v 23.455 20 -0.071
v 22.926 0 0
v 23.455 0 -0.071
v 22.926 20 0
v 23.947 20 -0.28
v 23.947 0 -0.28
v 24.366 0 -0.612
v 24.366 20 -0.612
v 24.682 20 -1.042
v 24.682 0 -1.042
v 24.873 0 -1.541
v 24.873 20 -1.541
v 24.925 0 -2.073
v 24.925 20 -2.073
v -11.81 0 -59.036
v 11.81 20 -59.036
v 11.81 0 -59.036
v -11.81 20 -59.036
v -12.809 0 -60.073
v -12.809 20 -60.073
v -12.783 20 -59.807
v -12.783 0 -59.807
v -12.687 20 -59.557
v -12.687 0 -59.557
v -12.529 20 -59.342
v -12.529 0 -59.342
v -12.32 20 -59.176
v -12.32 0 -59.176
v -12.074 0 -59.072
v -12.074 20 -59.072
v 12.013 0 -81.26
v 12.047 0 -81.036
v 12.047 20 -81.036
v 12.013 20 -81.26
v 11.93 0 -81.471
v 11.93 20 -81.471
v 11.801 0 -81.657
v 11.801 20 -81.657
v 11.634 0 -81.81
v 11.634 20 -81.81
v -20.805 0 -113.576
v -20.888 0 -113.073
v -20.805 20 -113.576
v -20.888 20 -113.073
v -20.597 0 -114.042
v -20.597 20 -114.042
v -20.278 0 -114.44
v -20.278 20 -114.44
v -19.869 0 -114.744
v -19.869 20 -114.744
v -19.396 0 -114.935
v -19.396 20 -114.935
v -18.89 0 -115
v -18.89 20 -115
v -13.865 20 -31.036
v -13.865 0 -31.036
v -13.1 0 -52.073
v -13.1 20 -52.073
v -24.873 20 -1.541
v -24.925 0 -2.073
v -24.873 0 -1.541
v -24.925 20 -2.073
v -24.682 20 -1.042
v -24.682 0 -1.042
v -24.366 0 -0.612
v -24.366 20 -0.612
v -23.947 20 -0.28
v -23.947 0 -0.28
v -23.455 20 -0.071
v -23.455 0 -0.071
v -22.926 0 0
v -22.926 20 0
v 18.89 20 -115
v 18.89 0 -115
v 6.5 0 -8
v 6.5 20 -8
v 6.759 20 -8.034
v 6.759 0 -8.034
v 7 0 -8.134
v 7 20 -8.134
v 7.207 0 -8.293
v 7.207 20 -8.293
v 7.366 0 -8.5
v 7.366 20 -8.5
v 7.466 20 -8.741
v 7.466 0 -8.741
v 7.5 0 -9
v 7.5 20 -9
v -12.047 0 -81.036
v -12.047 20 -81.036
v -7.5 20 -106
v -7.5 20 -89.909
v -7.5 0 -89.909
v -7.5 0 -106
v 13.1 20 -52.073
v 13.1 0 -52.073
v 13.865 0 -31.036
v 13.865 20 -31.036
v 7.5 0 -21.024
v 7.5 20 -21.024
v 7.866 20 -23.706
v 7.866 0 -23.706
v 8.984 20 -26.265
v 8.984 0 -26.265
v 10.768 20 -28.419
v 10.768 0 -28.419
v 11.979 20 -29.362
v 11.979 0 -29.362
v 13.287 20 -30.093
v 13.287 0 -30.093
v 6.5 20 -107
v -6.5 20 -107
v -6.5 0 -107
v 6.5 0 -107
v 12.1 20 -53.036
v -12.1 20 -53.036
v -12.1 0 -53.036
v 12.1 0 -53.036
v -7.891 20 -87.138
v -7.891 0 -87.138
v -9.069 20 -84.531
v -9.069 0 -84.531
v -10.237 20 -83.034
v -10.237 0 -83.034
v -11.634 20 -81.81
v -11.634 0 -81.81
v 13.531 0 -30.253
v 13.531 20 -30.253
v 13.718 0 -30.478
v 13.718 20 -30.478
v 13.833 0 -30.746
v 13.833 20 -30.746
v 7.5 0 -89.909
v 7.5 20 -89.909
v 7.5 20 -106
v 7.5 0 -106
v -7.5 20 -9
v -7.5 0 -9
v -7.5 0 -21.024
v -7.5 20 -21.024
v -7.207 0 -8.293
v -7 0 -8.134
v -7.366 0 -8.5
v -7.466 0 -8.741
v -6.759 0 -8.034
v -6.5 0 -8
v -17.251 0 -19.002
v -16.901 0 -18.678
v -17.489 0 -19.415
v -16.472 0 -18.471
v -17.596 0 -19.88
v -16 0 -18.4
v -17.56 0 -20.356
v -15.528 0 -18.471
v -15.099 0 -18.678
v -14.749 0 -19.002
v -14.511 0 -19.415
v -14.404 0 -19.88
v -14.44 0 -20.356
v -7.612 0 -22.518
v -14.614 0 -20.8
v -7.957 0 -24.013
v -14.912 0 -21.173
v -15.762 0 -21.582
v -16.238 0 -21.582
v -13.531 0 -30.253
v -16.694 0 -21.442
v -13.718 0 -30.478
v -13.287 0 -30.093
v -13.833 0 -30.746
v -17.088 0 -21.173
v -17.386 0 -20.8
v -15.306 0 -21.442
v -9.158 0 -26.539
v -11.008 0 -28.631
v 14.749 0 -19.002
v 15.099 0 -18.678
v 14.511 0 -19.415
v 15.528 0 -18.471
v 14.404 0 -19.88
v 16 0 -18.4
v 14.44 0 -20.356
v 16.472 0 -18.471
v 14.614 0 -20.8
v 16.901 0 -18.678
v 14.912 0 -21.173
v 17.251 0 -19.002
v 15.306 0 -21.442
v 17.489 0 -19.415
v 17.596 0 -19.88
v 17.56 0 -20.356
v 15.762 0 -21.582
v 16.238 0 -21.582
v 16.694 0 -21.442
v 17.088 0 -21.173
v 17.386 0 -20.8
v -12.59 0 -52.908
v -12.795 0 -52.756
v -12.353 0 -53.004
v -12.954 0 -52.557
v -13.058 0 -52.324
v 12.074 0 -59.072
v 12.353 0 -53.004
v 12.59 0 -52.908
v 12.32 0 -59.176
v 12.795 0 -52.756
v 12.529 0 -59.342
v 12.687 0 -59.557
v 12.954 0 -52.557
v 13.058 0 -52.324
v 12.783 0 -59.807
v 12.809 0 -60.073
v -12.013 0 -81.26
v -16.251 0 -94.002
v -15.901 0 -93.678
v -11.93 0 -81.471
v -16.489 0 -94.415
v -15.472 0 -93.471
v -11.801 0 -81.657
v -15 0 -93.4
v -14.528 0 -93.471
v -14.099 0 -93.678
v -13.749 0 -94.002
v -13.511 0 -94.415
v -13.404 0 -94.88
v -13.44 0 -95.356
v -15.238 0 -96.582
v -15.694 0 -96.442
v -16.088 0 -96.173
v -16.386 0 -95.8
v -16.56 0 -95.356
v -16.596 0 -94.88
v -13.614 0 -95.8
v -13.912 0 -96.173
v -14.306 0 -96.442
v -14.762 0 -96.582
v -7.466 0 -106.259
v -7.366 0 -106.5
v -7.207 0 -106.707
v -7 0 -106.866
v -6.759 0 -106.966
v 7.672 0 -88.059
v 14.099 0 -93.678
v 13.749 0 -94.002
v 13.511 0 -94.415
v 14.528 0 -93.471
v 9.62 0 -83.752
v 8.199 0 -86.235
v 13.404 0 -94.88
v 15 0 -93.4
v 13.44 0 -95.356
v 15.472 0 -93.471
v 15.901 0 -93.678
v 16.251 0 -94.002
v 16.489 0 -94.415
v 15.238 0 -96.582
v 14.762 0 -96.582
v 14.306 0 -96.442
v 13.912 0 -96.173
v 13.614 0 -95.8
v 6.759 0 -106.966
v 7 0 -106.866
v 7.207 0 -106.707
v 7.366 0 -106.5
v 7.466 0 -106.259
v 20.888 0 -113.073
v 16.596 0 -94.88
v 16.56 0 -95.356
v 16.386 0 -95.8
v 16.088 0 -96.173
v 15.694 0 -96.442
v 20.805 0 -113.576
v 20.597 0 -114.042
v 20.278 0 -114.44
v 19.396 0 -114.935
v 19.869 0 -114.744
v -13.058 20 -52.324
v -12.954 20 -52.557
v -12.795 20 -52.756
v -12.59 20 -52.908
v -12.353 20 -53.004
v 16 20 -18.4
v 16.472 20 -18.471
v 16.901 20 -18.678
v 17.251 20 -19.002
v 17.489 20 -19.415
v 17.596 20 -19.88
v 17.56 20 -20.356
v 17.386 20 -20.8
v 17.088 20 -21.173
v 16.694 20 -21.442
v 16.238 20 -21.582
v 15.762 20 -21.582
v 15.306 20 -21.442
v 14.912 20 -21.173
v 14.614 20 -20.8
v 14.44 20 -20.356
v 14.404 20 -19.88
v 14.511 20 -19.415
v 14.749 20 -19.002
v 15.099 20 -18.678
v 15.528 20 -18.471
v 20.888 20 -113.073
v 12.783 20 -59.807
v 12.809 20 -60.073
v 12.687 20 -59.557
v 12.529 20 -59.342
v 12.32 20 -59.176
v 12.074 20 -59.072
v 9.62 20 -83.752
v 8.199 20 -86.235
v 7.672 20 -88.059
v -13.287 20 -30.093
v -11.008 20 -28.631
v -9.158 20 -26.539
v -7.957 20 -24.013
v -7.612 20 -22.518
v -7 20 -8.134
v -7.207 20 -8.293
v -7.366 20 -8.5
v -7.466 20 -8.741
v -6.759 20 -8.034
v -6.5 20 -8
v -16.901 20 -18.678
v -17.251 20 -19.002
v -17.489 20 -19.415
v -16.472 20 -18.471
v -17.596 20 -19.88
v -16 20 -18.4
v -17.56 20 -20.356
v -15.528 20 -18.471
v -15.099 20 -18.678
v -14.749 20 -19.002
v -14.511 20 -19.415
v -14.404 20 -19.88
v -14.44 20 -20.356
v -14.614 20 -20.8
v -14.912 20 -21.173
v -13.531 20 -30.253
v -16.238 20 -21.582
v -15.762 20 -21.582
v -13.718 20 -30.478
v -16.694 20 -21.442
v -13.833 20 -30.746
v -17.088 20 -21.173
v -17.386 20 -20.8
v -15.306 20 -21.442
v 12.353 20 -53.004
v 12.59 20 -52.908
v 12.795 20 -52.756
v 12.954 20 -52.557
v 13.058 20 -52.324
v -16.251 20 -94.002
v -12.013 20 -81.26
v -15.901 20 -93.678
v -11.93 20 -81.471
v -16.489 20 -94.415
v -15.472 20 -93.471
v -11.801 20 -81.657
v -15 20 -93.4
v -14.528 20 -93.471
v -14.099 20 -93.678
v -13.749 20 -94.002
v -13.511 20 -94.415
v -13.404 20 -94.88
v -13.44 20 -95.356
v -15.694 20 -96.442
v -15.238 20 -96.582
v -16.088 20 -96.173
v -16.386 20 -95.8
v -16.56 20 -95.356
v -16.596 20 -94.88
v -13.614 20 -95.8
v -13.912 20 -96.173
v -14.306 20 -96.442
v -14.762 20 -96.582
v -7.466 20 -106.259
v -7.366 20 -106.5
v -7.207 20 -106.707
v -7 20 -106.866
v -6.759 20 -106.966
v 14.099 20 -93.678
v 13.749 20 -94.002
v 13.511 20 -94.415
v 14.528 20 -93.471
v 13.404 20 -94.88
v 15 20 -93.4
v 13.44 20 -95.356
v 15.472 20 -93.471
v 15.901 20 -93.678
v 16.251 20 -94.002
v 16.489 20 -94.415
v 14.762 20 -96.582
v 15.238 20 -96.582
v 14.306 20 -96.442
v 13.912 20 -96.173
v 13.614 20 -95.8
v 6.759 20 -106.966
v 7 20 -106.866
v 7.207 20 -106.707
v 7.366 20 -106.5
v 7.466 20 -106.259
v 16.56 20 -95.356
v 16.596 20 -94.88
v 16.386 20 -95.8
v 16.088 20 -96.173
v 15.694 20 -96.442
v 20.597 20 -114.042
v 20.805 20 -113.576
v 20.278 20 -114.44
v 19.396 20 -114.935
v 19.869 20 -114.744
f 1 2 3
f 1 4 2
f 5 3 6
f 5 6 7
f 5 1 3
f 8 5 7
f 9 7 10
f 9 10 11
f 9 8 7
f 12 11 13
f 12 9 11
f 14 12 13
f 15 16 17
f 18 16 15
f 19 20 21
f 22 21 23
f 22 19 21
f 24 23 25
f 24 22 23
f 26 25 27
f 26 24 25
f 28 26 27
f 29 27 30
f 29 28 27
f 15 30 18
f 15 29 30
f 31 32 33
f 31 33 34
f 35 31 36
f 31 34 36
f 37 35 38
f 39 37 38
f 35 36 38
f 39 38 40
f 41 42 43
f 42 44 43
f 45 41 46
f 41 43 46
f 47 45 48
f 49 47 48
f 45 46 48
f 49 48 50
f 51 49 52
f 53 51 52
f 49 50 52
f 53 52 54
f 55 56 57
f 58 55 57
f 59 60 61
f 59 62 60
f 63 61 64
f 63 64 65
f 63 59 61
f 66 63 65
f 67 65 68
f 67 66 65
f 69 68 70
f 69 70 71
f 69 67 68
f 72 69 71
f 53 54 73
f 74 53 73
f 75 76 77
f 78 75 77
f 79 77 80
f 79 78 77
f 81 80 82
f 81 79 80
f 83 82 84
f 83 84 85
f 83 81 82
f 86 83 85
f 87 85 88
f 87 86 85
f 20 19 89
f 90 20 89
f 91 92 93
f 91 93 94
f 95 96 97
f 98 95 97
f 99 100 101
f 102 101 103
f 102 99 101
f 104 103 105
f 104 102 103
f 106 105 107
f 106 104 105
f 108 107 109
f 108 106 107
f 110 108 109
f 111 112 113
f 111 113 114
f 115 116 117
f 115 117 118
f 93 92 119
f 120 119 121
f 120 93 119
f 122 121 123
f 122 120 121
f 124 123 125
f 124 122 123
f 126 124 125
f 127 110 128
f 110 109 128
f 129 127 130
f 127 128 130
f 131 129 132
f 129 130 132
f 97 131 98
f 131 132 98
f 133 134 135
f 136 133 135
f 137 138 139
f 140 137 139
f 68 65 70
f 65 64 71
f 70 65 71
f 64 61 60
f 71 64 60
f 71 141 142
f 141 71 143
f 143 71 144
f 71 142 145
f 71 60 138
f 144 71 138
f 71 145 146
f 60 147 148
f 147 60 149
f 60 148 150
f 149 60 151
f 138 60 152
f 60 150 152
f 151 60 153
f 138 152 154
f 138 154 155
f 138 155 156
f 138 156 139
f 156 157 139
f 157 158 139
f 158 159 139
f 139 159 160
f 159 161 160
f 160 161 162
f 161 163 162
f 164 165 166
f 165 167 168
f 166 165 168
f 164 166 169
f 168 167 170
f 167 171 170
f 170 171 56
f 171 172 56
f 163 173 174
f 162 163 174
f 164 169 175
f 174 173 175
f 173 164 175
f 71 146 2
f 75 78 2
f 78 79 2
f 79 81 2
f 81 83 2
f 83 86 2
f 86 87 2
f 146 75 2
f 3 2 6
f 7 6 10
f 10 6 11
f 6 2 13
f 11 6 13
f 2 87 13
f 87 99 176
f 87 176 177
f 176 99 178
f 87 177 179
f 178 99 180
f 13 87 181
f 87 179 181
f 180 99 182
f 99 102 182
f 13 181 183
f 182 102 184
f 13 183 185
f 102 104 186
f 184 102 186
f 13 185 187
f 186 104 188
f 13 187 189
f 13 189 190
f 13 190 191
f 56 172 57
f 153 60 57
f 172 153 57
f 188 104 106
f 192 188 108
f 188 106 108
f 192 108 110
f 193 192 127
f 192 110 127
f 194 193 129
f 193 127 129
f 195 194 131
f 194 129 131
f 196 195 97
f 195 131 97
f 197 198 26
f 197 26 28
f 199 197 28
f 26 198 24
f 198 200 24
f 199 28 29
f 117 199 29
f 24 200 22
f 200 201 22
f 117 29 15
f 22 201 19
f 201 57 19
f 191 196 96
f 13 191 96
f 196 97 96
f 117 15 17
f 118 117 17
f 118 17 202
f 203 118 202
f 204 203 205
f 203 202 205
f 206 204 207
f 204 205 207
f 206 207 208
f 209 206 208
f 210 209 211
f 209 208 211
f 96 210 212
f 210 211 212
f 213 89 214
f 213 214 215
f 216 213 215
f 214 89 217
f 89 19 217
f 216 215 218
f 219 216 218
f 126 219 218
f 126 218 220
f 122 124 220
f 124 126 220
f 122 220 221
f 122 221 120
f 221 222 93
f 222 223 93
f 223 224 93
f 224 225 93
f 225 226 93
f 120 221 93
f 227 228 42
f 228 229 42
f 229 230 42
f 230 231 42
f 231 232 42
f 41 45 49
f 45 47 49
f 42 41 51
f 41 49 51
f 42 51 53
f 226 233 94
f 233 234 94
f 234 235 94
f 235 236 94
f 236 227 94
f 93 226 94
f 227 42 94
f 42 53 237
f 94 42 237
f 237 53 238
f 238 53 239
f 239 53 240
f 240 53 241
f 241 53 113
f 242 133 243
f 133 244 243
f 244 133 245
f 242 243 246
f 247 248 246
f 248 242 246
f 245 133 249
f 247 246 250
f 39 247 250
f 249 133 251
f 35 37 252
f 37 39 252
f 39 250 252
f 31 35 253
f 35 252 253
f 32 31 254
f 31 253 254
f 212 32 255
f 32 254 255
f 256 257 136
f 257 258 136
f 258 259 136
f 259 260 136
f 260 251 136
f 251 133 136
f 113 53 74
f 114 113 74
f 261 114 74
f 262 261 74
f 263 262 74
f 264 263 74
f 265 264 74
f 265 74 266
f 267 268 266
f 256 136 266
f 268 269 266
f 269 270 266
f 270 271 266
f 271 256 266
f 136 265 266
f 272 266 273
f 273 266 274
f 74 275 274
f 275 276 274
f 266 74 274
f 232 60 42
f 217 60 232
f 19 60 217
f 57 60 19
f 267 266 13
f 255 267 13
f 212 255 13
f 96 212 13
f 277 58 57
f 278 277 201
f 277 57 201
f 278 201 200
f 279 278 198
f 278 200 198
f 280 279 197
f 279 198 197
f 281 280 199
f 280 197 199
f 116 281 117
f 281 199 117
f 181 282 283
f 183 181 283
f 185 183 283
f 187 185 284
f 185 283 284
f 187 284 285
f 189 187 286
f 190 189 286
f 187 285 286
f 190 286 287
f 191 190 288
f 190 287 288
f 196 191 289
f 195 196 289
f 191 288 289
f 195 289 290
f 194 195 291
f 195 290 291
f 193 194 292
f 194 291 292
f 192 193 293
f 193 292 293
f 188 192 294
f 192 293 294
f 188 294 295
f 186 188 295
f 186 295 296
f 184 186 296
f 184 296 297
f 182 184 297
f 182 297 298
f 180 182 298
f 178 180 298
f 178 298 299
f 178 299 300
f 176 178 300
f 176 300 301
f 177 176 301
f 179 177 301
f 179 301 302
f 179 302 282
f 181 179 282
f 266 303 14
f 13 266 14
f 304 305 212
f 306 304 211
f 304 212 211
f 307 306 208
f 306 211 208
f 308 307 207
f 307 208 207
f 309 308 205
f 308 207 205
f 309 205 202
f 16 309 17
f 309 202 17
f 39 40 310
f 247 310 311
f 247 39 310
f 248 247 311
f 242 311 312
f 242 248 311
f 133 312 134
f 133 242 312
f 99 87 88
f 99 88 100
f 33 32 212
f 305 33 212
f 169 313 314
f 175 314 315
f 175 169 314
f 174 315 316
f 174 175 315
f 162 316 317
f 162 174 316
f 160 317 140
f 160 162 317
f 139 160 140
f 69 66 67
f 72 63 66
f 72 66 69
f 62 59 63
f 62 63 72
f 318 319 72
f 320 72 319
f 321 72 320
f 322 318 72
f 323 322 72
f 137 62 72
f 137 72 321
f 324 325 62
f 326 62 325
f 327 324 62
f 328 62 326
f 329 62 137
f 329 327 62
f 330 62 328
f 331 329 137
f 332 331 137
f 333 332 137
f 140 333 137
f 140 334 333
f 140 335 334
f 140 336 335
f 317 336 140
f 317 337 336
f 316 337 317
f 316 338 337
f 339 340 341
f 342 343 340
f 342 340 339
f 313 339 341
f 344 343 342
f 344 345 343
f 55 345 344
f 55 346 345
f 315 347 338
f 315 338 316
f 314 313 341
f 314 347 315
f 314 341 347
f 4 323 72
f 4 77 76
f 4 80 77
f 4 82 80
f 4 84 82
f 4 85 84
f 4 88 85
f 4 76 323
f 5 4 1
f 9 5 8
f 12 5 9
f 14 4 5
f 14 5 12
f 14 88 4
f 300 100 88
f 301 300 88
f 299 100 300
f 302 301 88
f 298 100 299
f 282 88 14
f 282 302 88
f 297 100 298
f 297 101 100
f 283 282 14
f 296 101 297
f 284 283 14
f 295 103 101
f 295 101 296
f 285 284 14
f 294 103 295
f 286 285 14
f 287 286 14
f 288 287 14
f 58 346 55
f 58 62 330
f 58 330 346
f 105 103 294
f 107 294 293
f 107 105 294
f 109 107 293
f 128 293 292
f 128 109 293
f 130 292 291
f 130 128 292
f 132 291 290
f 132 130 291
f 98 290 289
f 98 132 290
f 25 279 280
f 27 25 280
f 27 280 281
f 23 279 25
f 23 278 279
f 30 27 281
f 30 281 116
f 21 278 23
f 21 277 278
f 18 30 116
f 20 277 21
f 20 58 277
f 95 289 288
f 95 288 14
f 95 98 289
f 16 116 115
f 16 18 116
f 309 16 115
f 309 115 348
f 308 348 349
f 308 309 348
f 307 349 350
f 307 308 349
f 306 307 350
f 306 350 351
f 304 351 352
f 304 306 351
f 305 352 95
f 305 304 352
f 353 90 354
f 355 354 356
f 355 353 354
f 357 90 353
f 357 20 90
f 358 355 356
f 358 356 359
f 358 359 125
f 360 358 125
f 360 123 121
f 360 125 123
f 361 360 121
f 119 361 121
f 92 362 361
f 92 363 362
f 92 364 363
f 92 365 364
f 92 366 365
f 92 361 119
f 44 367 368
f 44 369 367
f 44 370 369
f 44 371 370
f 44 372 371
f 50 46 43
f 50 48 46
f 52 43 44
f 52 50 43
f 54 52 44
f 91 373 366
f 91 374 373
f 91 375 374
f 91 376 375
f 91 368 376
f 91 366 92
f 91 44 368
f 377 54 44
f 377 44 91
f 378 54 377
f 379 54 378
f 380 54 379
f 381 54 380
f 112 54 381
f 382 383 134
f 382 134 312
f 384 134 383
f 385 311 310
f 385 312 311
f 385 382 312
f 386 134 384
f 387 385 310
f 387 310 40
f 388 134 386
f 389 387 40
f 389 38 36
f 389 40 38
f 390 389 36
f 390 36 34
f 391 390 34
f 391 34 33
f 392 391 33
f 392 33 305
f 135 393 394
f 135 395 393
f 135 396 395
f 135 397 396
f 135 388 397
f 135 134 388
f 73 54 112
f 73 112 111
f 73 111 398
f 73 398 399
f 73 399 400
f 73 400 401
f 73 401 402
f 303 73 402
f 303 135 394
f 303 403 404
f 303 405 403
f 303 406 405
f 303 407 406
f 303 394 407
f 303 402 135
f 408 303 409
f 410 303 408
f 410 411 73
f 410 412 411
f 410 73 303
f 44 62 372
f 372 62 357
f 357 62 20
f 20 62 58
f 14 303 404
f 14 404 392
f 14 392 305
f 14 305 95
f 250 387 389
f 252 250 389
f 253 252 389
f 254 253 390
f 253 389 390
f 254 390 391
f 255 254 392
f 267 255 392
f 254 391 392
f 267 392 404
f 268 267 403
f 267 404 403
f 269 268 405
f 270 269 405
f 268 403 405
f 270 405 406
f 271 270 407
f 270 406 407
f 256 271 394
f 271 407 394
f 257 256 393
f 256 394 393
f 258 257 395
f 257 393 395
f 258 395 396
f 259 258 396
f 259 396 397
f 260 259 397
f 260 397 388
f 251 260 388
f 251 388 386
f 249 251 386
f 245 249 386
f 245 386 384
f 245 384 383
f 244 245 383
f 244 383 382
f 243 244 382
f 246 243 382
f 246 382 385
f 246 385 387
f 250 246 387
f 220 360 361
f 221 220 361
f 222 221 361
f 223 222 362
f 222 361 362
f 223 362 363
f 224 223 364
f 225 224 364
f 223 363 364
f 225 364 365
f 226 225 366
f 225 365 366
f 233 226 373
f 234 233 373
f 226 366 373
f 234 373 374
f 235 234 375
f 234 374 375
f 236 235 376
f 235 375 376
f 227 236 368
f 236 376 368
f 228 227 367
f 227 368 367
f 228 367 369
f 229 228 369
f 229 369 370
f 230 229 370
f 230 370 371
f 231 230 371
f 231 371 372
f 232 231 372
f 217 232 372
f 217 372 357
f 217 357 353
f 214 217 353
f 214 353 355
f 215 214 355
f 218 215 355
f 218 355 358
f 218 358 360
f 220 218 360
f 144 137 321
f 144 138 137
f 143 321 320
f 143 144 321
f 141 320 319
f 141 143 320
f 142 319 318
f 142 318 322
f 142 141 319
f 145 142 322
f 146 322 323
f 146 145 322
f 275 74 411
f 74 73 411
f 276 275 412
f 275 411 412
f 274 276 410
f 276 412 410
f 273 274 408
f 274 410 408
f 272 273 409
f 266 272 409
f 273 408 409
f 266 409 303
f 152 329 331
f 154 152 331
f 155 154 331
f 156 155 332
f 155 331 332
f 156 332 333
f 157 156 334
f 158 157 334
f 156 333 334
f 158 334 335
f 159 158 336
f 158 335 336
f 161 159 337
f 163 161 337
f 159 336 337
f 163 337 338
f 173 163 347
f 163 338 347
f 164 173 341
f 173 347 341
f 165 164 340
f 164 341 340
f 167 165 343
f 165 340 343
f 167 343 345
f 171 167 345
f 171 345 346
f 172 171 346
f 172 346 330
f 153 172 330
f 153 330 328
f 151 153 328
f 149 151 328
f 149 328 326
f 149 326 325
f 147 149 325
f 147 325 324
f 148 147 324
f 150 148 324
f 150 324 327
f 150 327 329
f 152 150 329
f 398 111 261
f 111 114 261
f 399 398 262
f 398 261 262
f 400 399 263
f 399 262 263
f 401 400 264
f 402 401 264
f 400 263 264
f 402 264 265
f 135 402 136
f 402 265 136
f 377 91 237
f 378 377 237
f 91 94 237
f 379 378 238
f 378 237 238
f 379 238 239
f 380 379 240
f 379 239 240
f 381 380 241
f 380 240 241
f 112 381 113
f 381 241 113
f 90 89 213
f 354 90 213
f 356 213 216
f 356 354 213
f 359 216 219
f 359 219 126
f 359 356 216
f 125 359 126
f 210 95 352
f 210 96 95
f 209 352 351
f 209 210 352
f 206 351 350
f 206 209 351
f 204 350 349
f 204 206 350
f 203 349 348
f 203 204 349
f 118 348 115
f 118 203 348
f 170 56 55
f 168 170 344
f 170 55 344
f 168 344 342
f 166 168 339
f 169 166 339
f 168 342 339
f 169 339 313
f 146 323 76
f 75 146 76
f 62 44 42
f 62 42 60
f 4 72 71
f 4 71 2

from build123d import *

# Parameters (mm, degrees)
SKETCH_1_R          = 1.6
SKETCH_1_R_2        = 2.1
EXTRUDE_1_DEPTH     = 20
EXTRUDE_2_DEPTH     = 20
SKETCH_3_R          = 1.6
CUT_EXTRUDE_1_DEPTH = 169.07736314
SKETCH_4_R          = 1.6
CUT_EXTRUDE_2_DEPTH = 169.07736314
SKETCH_6_W          = 50
SKETCH_6_H          = 15
SKETCH_6_W_2        = 77.817383139
SKETCH_6_H_2        = 81.542414759
CUT_EXTRUDE_3_DEPTH = 169.07736314
FILLET_1_R          = 2
CUT_EXTRUDE_4_DEPTH = 120.357877938
FILLET_2_R          = 1
SKETCH_8_W          = 15
SKETCH_8_H          = 22
SKETCH_8_H_2        = 25
CUT_EXTRUDE_5_DEPTH = 120.357877938
FILLET_3_R          = 10
FILLET_4_R          = 1
SKETCH_9_W          = 25.911411074
SKETCH_9_H          = 3
EXTRUDE_3_DEPTH     = 20
FILLET_5_R          = 1


with BuildPart() as part:
    # 草图1 → 凸台-拉伸1 (new body)
    with BuildSketch(Plane(origin=(0, 0, 0), x_dir=(1, 0, 0), z_dir=(0, 1, 0))):
        Polygon((-25, 0), (-19, 0), (-19, 165), (19, 165), (19, 0), (25, 0), (25, -15), (-25, -15), align=None)
        with Locations(Location((0, -7.5, 0), (0, 0, 270))):
            Circle(SKETCH_1_R, mode=Mode.SUBTRACT)
        with Locations(Location((20, -7.5, 0), (0, 0, 270))):
            Circle(SKETCH_1_R, mode=Mode.SUBTRACT)
        with Locations(Location((-20, -7.5, 0), (0, 0, 270))):
            Circle(SKETCH_1_R, mode=Mode.SUBTRACT)
        with Locations(Location((-15, 156, 0), (0, 0, 270))):
            Circle(SKETCH_1_R_2, mode=Mode.SUBTRACT)
        with Locations(Location((15, 156, 0), (0, 0, 270))):
            Circle(SKETCH_1_R_2, mode=Mode.SUBTRACT)
    extrude(amount=EXTRUDE_1_DEPTH)

    # 草图2 → 凸台-拉伸2 (add)
    with BuildSketch(Plane(origin=(0, 20, 0), x_dir=(1, 0, 0), z_dir=(0, 1, 0))):
        Polygon((-19, 165), (-25, 0), (-19, 0), align=None)
        Polygon((19, 165), (25, 0), (19, 0), align=None)
    extrude(amount=-EXTRUDE_2_DEPTH)

    # 草图3 → 切除-拉伸1 (cut, through all)
    with BuildSketch(Plane(origin=(0, 20, 0), x_dir=(1, 0, 0), z_dir=(0, 1, 0))):
        with Locations(Location((16, 20, 0), (0, 0, 270))):
            Circle(SKETCH_3_R)
        with Locations(Location((-16, 20, 0), (0, 0, 270))):
            Circle(SKETCH_3_R)
    extrude(amount=-CUT_EXTRUDE_1_DEPTH, mode=Mode.SUBTRACT)

    # 草图4 → 切除-拉伸2 (cut, through all)
    with BuildSketch(Plane(origin=(0, 20, 0), x_dir=(1, 0, 0), z_dir=(0, 1, 0))):
        with Locations(Location((-15, 95, 0), (0, 0, 270))):
            Circle(SKETCH_4_R)
        with Locations(Location((15, 95, 0), (0, 0, 270))):
            Circle(SKETCH_4_R)
    extrude(amount=-CUT_EXTRUDE_2_DEPTH, mode=Mode.SUBTRACT)

    # 草图6 → 切除-拉伸3 (cut, through all)
    with BuildSketch(Plane(origin=(0, 20, 0), x_dir=(1, 0, 0), z_dir=(0, 1, 0))):
        with Locations((0, -7.5)):
            Rectangle(SKETCH_6_W, SKETCH_6_H)
        with Locations((-0.977931814, 155.77120738)):
            Rectangle(SKETCH_6_W_2, SKETCH_6_H_2)
    extrude(amount=-CUT_EXTRUDE_3_DEPTH, mode=Mode.SUBTRACT)

    # 圆角1
    fillet_1_edges = [part.edges().sort_by_distance(p)[0] for p in [
        (20.818181818, 10, -115),
        (25, 10, 0),
        (-25, 10, 0),
        (-20.818181818, 10, -115),
    ]]
    fillet(fillet_1_edges, radius=FILLET_1_R)

    # 草图7 → 切除-拉伸4 (cut, through all)
    with BuildSketch(Plane.XZ):
        Polygon((-13.902481523, -30), (-12.011572432, -82), (12.011572432, -82), (13.902481523, -30), align=None)
    extrude(amount=-CUT_EXTRUDE_4_DEPTH, mode=Mode.SUBTRACT)

    # 圆角2
    fillet_2_edges = [part.edges().sort_by_distance(p)[0] for p in [
        (-12.011572432, 10, -82),
        (-13.902481523, 10, -30),
        (13.902481523, 10, -30),
        (12.011572432, 10, -82),
    ]]
    fillet(fillet_2_edges, radius=FILLET_2_R)

    # 草图8 → 切除-拉伸5 (cut, through all)
    with BuildSketch(Plane(origin=(0, 20, 0), x_dir=(1, 0, 0), z_dir=(0, 1, 0))):
        with Locations((0, 19)):
            Rectangle(SKETCH_8_W, SKETCH_8_H)
        with Locations((0, 94.5)):
            Rectangle(SKETCH_8_W, SKETCH_8_H_2)
    extrude(amount=-CUT_EXTRUDE_5_DEPTH, mode=Mode.SUBTRACT)

    # 圆角3
    fillet_3_edges = [part.edges().sort_by_distance(p)[0] for p in [
        (7.5, 10, -82),
        (-7.5, 10, -82),
        (7.5, 10, -30),
        (-7.5, 10, -30),
    ]]
    fillet(fillet_3_edges, radius=FILLET_3_R)

    # 圆角4
    fillet_4_edges = [part.edges().sort_by_distance(p)[0] for p in [
        (7.5, 10, -8),
        (-7.5, 10, -8),
        (7.5, 10, -107),
        (-7.5, 10, -107),
    ]]
    fillet(fillet_4_edges, radius=FILLET_4_R)

    # 草图9 → 凸台-拉伸3 (add)
    with BuildSketch(Plane(origin=(0, 20, 0), x_dir=(1, 0, 0), z_dir=(0, 1, 0))):
        with Locations((0, 54.536339618)):
            Rectangle(SKETCH_9_W, SKETCH_9_H)
        Polygon((13.064796446, 53.036339618), (12.955705537, 56.036339618), (12.955705537, 53.036339618), align=None)
        Polygon((-12.846614628, 59.036339618), (-12.955705537, 56.036339618), (12.955705537, 56.036339618), (12.846614628, 59.036339618), align=None)
        Polygon((-12.955705537, 53.036339618), (-12.955705537, 56.036339618), (-13.064796446, 53.036339618), align=None)
    extrude(amount=-EXTRUDE_3_DEPTH)

    # 圆角5
    fillet_5_edges = [part.edges().sort_by_distance(p)[0] for p in [
        (-12.846614628, 10, -59.036339618),
        (-13.064796446, 10, -53.036339618),
        (13.064796446, 10, -53.036339618),
        (12.846614628, 10, -59.036339618),
    ]]
    fillet(fillet_5_edges, radius=FILLET_5_R)


solid = part.part
